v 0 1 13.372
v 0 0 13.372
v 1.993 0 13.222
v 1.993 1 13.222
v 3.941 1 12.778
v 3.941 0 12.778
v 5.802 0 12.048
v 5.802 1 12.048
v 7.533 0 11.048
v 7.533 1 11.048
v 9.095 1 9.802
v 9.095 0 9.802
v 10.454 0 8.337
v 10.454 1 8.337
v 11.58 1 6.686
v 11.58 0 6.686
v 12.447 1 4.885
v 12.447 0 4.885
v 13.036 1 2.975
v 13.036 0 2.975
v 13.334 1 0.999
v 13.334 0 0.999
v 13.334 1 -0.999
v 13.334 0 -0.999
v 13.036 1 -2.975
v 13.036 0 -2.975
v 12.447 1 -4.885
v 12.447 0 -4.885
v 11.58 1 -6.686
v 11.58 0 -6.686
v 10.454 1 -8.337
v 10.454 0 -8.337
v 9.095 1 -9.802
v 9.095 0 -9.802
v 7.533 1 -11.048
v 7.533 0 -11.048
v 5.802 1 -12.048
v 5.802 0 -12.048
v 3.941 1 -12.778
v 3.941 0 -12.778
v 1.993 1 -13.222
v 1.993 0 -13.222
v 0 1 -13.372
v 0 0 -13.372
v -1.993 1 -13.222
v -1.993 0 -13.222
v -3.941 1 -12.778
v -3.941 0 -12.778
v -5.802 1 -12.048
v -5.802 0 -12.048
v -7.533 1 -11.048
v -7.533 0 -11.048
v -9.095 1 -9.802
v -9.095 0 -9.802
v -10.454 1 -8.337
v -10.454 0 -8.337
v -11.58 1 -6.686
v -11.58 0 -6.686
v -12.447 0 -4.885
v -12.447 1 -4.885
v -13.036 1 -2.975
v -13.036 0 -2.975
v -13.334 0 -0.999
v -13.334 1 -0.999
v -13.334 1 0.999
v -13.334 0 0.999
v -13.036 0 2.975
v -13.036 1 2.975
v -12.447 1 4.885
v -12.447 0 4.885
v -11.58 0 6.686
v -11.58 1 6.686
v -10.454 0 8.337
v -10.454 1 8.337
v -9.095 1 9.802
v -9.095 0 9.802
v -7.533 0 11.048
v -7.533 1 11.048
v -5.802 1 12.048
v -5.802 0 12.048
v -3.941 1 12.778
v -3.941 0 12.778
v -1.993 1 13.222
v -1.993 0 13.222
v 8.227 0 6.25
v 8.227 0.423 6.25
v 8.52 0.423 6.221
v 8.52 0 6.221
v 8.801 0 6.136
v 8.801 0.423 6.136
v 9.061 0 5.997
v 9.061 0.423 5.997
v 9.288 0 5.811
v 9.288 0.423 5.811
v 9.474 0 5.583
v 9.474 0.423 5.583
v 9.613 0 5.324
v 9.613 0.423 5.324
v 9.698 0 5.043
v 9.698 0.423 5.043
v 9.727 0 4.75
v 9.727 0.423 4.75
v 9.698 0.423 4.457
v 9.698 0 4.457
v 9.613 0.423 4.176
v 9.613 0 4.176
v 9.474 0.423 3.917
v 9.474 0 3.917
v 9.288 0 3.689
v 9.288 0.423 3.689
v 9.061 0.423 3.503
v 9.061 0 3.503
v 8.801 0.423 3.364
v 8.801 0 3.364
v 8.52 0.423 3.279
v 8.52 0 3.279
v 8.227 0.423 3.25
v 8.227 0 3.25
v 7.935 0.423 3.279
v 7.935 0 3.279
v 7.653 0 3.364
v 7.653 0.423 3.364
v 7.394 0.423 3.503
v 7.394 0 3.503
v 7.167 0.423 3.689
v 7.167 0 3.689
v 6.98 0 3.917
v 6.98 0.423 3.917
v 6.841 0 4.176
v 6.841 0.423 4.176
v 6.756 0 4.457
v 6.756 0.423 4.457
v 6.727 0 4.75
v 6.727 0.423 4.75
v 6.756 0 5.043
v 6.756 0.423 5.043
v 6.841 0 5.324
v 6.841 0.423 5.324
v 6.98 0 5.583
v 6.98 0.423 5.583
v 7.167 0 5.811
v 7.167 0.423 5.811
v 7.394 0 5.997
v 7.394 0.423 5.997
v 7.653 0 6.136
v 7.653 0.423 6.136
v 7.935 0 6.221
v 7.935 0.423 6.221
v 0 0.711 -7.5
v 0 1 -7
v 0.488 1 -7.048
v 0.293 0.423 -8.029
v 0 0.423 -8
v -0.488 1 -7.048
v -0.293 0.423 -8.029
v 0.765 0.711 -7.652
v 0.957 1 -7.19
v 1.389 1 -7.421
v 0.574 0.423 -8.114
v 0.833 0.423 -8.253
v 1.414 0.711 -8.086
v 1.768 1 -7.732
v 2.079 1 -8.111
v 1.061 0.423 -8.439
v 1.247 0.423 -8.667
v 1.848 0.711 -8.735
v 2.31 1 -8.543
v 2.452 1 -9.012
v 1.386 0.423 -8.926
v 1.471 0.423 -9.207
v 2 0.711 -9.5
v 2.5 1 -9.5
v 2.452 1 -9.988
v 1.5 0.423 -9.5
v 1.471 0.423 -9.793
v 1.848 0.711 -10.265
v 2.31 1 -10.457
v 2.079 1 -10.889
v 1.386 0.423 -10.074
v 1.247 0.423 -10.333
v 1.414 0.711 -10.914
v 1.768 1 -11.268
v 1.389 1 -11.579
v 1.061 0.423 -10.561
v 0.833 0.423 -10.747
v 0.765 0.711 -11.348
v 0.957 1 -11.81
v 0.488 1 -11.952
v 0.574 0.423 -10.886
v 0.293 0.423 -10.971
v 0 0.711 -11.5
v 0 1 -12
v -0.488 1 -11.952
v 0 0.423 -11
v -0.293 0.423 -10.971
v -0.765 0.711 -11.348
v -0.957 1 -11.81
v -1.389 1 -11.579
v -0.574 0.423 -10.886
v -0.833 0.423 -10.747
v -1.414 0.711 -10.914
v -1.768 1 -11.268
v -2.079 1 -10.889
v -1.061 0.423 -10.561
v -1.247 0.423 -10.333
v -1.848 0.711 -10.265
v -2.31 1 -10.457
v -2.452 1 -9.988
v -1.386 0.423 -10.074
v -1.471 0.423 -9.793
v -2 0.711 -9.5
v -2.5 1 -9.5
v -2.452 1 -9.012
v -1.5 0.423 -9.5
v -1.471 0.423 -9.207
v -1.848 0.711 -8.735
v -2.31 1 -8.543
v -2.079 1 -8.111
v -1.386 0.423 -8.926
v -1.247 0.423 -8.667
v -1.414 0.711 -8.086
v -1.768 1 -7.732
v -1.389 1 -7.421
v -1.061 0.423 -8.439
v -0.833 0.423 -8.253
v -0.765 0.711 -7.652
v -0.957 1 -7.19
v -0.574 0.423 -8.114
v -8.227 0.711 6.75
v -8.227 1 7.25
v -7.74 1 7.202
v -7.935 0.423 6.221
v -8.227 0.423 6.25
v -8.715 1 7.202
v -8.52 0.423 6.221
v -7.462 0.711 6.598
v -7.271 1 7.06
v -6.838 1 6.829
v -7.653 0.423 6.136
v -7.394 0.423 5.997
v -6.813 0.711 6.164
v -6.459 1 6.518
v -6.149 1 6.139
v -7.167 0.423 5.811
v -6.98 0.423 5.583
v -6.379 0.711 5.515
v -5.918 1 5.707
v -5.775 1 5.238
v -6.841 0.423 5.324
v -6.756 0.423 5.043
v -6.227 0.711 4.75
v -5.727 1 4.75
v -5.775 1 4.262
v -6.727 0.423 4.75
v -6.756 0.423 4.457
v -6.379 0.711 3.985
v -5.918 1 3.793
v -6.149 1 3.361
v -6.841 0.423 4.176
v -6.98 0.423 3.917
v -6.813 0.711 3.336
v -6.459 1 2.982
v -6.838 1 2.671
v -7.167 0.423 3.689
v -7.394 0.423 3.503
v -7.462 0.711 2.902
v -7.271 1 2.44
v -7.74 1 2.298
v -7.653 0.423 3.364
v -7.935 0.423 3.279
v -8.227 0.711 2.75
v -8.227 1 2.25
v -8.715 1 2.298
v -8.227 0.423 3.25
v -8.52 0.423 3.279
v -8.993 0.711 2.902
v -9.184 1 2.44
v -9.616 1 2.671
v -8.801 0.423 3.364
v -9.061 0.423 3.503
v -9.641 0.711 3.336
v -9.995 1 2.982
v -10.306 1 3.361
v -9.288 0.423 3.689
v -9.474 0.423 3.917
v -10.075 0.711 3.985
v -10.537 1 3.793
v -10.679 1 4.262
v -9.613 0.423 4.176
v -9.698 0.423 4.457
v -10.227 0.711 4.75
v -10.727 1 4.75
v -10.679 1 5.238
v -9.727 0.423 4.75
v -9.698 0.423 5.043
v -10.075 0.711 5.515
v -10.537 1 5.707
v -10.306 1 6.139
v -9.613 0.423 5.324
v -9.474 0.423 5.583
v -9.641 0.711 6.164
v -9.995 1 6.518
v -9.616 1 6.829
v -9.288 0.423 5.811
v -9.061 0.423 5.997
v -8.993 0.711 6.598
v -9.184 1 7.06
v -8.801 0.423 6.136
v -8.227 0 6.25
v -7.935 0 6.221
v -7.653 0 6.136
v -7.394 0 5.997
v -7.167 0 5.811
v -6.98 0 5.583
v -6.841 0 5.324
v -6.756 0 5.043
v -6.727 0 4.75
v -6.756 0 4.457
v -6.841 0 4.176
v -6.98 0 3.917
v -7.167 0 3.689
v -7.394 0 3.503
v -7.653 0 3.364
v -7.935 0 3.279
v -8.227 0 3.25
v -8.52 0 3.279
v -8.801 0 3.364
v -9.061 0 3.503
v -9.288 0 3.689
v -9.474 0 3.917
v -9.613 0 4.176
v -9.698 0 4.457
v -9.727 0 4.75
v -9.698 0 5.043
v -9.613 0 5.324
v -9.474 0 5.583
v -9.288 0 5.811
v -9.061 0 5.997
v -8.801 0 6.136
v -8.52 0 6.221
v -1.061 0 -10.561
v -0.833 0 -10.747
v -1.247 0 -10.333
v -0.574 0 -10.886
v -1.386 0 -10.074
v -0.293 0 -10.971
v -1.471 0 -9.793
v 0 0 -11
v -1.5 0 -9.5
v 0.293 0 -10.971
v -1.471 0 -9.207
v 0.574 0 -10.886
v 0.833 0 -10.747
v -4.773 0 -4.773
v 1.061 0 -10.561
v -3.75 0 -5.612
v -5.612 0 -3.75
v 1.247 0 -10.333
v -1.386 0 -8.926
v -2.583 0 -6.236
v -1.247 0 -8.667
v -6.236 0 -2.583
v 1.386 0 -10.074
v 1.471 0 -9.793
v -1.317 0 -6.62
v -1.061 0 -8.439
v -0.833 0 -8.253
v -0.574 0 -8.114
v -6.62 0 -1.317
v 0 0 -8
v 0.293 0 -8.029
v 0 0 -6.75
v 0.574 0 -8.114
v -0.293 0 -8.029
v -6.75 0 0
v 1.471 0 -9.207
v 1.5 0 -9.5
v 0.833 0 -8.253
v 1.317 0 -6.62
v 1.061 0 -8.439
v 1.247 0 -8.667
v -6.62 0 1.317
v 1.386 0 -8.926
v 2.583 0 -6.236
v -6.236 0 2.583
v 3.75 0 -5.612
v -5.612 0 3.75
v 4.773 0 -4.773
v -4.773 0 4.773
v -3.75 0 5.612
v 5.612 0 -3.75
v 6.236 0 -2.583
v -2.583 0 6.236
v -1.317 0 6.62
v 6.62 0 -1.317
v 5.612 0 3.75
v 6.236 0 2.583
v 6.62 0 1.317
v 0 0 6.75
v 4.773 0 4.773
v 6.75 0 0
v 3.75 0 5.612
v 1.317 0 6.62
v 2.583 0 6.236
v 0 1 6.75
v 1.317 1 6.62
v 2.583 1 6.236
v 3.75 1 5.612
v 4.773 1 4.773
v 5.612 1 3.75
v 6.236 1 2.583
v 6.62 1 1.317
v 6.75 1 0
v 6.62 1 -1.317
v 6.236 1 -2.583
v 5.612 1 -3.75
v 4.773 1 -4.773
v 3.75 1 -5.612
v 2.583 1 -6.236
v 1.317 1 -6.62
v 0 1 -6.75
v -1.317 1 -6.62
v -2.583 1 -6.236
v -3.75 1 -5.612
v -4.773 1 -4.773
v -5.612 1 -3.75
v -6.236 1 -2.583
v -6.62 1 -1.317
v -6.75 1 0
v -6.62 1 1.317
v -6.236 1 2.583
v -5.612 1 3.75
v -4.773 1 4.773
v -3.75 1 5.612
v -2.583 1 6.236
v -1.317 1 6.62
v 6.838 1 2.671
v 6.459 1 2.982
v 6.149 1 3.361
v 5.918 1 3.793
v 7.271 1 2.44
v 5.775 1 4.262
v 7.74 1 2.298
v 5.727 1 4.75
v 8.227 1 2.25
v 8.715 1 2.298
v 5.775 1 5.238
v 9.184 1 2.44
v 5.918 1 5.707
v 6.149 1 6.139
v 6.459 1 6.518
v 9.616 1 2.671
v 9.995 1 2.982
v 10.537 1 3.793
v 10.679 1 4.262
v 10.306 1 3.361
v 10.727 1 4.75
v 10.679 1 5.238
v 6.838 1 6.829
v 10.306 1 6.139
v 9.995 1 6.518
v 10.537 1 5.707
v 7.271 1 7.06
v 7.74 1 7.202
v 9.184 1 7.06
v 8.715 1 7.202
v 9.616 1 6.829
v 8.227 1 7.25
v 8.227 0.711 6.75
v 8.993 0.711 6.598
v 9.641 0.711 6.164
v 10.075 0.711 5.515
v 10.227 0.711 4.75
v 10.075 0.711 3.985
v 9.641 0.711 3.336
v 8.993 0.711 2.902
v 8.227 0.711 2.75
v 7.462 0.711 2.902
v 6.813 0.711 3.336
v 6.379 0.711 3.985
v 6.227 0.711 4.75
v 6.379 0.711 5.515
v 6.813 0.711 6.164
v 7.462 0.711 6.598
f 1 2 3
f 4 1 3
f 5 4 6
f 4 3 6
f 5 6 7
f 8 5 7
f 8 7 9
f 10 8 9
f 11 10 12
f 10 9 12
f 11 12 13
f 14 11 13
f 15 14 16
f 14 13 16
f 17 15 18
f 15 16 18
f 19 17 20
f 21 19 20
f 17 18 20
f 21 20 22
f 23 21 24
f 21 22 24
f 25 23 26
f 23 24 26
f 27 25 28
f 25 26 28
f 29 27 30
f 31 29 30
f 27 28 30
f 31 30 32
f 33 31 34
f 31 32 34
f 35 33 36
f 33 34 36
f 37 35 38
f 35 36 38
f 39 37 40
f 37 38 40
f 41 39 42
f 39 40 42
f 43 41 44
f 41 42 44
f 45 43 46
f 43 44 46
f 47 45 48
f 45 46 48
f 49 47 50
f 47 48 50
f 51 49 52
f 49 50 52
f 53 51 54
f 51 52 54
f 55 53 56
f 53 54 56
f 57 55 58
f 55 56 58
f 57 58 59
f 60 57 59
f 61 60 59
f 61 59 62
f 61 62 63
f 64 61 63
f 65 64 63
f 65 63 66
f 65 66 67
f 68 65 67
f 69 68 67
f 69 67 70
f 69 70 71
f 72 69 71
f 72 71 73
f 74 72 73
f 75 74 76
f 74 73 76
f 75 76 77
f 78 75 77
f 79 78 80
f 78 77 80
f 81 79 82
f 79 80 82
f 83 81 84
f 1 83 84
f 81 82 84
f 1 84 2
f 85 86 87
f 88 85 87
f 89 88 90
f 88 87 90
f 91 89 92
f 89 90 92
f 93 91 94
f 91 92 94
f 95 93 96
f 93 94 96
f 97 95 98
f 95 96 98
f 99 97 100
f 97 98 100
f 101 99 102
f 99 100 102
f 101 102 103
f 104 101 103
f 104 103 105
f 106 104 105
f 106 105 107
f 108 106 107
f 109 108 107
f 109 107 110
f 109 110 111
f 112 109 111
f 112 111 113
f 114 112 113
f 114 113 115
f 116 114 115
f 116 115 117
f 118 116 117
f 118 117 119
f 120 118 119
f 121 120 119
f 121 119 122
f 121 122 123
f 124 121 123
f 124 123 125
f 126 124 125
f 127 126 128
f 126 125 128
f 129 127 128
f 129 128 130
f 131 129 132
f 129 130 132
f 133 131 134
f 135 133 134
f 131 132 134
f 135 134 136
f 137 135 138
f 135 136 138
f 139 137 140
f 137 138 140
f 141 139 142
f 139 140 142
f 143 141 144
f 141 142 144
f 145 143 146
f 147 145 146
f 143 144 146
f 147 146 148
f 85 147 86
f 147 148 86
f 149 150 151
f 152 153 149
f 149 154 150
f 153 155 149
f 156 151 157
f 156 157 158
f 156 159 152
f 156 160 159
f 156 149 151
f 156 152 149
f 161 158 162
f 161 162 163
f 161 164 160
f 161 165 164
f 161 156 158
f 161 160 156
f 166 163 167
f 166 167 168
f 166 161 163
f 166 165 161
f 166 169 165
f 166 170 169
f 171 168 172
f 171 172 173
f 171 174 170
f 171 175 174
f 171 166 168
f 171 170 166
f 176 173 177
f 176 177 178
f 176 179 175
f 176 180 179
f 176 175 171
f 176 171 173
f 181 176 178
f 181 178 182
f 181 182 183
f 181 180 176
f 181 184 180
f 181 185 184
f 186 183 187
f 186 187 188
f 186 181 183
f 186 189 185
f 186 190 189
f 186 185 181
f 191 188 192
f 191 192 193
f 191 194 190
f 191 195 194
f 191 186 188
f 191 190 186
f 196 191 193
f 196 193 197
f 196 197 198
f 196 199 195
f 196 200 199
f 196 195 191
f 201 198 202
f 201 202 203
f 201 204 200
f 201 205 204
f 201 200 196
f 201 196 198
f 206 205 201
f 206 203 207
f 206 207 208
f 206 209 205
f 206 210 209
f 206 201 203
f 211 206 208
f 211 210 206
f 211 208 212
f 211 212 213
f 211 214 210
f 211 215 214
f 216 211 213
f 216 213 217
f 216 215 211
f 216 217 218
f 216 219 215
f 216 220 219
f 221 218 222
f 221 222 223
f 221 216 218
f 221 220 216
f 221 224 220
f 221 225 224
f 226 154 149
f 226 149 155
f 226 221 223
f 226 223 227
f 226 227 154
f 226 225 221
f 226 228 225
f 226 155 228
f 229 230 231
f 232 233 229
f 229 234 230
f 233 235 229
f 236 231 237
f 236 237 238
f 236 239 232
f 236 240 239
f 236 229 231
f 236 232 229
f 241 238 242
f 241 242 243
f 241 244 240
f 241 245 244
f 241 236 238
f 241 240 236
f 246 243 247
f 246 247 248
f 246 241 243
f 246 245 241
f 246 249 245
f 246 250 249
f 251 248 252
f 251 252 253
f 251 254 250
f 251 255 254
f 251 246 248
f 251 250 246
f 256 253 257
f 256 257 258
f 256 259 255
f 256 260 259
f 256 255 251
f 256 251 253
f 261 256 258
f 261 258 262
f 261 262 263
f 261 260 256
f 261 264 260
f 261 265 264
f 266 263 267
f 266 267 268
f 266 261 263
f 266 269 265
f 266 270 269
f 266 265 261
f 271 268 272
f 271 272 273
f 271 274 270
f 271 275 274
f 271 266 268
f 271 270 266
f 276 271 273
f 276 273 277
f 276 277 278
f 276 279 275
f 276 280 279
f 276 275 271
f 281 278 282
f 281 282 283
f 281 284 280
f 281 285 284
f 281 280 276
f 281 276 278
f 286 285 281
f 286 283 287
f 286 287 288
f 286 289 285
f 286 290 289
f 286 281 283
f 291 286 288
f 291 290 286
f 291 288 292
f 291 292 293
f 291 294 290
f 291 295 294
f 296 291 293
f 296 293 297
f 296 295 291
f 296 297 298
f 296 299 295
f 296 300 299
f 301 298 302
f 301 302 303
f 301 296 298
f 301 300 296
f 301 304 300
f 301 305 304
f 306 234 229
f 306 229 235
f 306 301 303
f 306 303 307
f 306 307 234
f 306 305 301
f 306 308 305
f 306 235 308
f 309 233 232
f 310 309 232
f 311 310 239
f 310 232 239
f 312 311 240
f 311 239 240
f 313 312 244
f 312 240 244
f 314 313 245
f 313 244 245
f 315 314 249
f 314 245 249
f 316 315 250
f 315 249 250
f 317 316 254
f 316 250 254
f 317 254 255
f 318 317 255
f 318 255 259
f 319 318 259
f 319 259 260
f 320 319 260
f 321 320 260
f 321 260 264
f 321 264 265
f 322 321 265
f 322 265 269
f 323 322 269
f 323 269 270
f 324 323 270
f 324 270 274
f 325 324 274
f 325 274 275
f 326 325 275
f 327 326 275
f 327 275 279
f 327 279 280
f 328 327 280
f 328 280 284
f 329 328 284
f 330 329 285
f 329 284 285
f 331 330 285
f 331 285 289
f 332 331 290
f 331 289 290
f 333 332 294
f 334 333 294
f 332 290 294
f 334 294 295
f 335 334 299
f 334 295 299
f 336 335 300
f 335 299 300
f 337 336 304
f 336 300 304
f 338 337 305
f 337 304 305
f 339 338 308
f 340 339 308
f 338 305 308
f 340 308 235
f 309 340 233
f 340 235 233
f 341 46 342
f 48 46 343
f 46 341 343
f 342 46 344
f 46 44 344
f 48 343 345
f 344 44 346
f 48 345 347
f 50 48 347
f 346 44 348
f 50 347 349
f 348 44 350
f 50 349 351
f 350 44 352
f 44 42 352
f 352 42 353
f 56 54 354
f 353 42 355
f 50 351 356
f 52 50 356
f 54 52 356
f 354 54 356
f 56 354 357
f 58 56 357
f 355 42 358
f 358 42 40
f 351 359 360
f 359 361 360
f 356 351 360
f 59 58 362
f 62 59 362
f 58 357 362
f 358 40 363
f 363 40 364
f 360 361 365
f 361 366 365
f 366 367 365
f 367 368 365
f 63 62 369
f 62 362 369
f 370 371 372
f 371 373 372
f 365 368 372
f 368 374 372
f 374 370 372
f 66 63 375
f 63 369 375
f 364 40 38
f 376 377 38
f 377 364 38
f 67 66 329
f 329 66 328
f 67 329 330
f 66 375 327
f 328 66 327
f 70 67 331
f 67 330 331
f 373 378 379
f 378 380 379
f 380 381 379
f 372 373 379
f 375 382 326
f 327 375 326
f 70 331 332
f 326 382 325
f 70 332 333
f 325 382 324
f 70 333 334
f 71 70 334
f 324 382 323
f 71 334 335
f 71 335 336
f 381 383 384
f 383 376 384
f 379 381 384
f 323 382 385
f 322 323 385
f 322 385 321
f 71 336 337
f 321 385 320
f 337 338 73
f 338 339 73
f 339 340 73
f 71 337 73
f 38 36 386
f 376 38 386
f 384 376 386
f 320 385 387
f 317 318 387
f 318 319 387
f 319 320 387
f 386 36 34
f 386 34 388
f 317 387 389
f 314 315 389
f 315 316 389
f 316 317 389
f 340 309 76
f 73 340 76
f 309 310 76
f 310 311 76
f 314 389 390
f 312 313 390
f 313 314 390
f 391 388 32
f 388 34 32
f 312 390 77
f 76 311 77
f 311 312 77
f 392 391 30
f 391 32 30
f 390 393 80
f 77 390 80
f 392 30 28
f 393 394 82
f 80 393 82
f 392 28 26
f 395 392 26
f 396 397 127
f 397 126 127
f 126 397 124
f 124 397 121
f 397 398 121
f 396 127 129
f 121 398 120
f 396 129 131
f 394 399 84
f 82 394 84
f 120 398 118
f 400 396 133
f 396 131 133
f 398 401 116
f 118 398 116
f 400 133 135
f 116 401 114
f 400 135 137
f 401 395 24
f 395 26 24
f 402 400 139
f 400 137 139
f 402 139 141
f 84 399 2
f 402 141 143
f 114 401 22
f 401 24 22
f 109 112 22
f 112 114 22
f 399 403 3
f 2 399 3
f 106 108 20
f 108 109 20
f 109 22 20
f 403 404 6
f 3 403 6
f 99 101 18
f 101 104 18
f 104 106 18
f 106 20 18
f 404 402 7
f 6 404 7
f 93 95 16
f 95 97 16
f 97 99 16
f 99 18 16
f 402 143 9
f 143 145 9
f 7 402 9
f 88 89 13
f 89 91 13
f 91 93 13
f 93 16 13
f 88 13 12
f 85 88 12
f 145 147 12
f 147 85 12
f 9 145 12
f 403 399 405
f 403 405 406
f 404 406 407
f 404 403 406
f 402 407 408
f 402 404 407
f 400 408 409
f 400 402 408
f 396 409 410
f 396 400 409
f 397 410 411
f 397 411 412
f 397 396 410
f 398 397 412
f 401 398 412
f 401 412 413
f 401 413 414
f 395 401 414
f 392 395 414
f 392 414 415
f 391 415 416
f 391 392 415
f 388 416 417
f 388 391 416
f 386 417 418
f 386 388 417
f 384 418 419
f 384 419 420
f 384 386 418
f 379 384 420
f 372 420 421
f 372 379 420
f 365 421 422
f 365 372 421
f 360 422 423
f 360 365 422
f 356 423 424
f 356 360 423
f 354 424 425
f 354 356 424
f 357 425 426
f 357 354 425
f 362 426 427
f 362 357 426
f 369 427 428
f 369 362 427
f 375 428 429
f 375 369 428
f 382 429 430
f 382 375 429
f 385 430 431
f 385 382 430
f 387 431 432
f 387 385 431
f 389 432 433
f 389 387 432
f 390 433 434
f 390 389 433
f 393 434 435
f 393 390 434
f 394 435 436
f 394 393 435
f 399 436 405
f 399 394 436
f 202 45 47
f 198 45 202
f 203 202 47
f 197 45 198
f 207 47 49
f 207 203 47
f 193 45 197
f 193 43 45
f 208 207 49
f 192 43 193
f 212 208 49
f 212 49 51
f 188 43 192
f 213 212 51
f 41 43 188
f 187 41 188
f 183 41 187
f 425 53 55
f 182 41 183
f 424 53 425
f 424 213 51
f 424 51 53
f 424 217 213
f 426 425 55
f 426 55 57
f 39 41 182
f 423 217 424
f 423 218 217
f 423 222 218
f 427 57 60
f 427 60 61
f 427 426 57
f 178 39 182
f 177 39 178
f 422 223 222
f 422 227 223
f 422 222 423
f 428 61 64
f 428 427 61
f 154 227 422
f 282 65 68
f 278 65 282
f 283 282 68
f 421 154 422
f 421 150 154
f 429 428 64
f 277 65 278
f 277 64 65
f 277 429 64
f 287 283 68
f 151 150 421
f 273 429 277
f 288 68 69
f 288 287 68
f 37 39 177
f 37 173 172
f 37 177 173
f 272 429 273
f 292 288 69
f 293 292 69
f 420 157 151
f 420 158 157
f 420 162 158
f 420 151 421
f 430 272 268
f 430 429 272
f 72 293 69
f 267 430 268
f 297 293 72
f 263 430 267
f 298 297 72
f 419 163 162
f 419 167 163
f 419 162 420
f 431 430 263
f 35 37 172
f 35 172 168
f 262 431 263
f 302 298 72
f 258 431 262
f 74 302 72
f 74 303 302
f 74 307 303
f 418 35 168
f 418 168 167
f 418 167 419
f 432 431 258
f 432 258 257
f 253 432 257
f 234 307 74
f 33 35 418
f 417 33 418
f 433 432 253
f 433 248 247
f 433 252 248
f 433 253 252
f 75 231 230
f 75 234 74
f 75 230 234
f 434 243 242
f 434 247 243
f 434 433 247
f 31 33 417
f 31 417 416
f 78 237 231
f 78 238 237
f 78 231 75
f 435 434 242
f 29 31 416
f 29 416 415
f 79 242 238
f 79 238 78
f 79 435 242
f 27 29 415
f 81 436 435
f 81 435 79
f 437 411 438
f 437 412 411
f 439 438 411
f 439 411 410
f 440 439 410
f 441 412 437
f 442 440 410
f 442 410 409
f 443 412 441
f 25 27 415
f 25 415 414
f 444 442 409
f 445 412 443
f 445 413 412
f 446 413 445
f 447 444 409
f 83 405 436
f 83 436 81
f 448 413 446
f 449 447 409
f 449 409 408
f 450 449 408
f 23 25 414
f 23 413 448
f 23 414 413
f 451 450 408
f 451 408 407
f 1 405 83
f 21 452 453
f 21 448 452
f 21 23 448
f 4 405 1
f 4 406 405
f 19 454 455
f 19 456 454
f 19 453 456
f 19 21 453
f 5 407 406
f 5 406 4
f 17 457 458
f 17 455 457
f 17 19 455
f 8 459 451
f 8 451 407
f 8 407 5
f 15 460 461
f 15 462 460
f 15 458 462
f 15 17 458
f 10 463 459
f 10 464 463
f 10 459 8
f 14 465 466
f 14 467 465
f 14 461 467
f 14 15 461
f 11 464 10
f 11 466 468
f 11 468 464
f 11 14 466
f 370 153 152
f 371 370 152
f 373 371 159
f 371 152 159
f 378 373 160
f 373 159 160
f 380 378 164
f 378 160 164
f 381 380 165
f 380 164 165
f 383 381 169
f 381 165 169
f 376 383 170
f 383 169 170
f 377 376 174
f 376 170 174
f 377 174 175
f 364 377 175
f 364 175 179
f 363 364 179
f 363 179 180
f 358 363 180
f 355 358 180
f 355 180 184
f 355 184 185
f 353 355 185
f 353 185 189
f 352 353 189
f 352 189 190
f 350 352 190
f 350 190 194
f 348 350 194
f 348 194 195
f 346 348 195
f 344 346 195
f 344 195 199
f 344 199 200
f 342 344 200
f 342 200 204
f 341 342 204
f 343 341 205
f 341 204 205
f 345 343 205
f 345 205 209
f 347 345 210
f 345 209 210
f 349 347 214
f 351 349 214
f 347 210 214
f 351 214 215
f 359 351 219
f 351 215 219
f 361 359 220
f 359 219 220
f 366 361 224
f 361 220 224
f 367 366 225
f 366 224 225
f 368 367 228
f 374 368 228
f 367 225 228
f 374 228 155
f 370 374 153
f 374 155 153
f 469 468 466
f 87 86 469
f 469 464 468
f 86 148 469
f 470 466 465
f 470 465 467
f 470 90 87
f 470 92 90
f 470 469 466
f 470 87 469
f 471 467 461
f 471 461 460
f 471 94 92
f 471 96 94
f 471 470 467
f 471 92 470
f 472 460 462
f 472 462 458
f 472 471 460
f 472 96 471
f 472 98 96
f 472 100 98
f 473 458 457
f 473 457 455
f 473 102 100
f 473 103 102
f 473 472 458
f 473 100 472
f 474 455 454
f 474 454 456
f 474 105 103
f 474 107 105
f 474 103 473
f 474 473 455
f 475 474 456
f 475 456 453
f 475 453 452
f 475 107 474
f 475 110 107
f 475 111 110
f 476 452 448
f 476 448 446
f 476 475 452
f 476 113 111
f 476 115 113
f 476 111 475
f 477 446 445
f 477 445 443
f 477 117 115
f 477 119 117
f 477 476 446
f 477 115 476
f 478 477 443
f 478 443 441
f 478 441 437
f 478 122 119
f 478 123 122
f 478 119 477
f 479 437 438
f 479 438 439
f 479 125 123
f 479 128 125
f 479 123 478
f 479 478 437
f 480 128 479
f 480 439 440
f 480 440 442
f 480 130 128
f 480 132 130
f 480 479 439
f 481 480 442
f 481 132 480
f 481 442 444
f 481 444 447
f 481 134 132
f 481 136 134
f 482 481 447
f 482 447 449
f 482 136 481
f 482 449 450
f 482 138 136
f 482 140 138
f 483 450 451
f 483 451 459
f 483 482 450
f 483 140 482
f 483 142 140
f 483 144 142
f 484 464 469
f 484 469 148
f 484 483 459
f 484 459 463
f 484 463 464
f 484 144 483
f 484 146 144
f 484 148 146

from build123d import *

# Parameters (mm, degrees)
SKETCH_1_R          = 13.371753228
SKETCH_1_R_2        = 6.75
EXTRUDE_1_DEPTH     = 1
SKETCH_2_R          = 1.5
CUT_EXTRUDE_1_DEPTH = 2
CHAMFER_1_SIZE      = 1
CHAMFER_1_SIZE2     = 0.577350269


with BuildPart() as part:
    # 草图1 → 凸台-拉伸1 (new body)
    with BuildSketch(Plane(origin=(0, 0, 0), x_dir=(1, 0, 0), z_dir=(0, 1, 0))):
        with Locations(Location((0, 0, 0), (0, 0, 270))):
            Circle(SKETCH_1_R)
        with Locations(Location((0, 0, 0), (0, 0, 270))):
            Circle(SKETCH_1_R_2, mode=Mode.SUBTRACT)
    extrude(amount=EXTRUDE_1_DEPTH)

    # 草图2 → 切除-拉伸1 (cut)
    with BuildSketch(Plane(origin=(0, 1, 0), x_dir=(1, 0, 0), z_dir=(0, 1, 0))):
        with Locations(Location((0, 9.5, 0), (0, 0, 270))):
            Circle(SKETCH_2_R)
        with Locations(Location((8.227241336, -4.75, 0), (0, 0, 270))):
            Circle(SKETCH_2_R)
        with Locations(Location((-8.227241336, -4.75, 0), (0, 0, 270))):
            Circle(SKETCH_2_R)
    extrude(amount=-CUT_EXTRUDE_1_DEPTH, mode=Mode.SUBTRACT)

    # 倒角1
    chamfer_1_edges = [part.edges().sort_by_distance(p)[0] for p in [
        (0, 1, -11),
        (8.227241336, 1, 3.25),
        (-8.227241336, 1, 3.25),
    ]]
    chamfer_1_side = [part.faces().sort_by_distance(p)[0] for p in [
        (0, 1, -12.993542933),
    ]]
    chamfer(chamfer_1_edges, length=CHAMFER_1_SIZE, length2=CHAMFER_1_SIZE2, reference=chamfer_1_side[0])


solid = part.part
